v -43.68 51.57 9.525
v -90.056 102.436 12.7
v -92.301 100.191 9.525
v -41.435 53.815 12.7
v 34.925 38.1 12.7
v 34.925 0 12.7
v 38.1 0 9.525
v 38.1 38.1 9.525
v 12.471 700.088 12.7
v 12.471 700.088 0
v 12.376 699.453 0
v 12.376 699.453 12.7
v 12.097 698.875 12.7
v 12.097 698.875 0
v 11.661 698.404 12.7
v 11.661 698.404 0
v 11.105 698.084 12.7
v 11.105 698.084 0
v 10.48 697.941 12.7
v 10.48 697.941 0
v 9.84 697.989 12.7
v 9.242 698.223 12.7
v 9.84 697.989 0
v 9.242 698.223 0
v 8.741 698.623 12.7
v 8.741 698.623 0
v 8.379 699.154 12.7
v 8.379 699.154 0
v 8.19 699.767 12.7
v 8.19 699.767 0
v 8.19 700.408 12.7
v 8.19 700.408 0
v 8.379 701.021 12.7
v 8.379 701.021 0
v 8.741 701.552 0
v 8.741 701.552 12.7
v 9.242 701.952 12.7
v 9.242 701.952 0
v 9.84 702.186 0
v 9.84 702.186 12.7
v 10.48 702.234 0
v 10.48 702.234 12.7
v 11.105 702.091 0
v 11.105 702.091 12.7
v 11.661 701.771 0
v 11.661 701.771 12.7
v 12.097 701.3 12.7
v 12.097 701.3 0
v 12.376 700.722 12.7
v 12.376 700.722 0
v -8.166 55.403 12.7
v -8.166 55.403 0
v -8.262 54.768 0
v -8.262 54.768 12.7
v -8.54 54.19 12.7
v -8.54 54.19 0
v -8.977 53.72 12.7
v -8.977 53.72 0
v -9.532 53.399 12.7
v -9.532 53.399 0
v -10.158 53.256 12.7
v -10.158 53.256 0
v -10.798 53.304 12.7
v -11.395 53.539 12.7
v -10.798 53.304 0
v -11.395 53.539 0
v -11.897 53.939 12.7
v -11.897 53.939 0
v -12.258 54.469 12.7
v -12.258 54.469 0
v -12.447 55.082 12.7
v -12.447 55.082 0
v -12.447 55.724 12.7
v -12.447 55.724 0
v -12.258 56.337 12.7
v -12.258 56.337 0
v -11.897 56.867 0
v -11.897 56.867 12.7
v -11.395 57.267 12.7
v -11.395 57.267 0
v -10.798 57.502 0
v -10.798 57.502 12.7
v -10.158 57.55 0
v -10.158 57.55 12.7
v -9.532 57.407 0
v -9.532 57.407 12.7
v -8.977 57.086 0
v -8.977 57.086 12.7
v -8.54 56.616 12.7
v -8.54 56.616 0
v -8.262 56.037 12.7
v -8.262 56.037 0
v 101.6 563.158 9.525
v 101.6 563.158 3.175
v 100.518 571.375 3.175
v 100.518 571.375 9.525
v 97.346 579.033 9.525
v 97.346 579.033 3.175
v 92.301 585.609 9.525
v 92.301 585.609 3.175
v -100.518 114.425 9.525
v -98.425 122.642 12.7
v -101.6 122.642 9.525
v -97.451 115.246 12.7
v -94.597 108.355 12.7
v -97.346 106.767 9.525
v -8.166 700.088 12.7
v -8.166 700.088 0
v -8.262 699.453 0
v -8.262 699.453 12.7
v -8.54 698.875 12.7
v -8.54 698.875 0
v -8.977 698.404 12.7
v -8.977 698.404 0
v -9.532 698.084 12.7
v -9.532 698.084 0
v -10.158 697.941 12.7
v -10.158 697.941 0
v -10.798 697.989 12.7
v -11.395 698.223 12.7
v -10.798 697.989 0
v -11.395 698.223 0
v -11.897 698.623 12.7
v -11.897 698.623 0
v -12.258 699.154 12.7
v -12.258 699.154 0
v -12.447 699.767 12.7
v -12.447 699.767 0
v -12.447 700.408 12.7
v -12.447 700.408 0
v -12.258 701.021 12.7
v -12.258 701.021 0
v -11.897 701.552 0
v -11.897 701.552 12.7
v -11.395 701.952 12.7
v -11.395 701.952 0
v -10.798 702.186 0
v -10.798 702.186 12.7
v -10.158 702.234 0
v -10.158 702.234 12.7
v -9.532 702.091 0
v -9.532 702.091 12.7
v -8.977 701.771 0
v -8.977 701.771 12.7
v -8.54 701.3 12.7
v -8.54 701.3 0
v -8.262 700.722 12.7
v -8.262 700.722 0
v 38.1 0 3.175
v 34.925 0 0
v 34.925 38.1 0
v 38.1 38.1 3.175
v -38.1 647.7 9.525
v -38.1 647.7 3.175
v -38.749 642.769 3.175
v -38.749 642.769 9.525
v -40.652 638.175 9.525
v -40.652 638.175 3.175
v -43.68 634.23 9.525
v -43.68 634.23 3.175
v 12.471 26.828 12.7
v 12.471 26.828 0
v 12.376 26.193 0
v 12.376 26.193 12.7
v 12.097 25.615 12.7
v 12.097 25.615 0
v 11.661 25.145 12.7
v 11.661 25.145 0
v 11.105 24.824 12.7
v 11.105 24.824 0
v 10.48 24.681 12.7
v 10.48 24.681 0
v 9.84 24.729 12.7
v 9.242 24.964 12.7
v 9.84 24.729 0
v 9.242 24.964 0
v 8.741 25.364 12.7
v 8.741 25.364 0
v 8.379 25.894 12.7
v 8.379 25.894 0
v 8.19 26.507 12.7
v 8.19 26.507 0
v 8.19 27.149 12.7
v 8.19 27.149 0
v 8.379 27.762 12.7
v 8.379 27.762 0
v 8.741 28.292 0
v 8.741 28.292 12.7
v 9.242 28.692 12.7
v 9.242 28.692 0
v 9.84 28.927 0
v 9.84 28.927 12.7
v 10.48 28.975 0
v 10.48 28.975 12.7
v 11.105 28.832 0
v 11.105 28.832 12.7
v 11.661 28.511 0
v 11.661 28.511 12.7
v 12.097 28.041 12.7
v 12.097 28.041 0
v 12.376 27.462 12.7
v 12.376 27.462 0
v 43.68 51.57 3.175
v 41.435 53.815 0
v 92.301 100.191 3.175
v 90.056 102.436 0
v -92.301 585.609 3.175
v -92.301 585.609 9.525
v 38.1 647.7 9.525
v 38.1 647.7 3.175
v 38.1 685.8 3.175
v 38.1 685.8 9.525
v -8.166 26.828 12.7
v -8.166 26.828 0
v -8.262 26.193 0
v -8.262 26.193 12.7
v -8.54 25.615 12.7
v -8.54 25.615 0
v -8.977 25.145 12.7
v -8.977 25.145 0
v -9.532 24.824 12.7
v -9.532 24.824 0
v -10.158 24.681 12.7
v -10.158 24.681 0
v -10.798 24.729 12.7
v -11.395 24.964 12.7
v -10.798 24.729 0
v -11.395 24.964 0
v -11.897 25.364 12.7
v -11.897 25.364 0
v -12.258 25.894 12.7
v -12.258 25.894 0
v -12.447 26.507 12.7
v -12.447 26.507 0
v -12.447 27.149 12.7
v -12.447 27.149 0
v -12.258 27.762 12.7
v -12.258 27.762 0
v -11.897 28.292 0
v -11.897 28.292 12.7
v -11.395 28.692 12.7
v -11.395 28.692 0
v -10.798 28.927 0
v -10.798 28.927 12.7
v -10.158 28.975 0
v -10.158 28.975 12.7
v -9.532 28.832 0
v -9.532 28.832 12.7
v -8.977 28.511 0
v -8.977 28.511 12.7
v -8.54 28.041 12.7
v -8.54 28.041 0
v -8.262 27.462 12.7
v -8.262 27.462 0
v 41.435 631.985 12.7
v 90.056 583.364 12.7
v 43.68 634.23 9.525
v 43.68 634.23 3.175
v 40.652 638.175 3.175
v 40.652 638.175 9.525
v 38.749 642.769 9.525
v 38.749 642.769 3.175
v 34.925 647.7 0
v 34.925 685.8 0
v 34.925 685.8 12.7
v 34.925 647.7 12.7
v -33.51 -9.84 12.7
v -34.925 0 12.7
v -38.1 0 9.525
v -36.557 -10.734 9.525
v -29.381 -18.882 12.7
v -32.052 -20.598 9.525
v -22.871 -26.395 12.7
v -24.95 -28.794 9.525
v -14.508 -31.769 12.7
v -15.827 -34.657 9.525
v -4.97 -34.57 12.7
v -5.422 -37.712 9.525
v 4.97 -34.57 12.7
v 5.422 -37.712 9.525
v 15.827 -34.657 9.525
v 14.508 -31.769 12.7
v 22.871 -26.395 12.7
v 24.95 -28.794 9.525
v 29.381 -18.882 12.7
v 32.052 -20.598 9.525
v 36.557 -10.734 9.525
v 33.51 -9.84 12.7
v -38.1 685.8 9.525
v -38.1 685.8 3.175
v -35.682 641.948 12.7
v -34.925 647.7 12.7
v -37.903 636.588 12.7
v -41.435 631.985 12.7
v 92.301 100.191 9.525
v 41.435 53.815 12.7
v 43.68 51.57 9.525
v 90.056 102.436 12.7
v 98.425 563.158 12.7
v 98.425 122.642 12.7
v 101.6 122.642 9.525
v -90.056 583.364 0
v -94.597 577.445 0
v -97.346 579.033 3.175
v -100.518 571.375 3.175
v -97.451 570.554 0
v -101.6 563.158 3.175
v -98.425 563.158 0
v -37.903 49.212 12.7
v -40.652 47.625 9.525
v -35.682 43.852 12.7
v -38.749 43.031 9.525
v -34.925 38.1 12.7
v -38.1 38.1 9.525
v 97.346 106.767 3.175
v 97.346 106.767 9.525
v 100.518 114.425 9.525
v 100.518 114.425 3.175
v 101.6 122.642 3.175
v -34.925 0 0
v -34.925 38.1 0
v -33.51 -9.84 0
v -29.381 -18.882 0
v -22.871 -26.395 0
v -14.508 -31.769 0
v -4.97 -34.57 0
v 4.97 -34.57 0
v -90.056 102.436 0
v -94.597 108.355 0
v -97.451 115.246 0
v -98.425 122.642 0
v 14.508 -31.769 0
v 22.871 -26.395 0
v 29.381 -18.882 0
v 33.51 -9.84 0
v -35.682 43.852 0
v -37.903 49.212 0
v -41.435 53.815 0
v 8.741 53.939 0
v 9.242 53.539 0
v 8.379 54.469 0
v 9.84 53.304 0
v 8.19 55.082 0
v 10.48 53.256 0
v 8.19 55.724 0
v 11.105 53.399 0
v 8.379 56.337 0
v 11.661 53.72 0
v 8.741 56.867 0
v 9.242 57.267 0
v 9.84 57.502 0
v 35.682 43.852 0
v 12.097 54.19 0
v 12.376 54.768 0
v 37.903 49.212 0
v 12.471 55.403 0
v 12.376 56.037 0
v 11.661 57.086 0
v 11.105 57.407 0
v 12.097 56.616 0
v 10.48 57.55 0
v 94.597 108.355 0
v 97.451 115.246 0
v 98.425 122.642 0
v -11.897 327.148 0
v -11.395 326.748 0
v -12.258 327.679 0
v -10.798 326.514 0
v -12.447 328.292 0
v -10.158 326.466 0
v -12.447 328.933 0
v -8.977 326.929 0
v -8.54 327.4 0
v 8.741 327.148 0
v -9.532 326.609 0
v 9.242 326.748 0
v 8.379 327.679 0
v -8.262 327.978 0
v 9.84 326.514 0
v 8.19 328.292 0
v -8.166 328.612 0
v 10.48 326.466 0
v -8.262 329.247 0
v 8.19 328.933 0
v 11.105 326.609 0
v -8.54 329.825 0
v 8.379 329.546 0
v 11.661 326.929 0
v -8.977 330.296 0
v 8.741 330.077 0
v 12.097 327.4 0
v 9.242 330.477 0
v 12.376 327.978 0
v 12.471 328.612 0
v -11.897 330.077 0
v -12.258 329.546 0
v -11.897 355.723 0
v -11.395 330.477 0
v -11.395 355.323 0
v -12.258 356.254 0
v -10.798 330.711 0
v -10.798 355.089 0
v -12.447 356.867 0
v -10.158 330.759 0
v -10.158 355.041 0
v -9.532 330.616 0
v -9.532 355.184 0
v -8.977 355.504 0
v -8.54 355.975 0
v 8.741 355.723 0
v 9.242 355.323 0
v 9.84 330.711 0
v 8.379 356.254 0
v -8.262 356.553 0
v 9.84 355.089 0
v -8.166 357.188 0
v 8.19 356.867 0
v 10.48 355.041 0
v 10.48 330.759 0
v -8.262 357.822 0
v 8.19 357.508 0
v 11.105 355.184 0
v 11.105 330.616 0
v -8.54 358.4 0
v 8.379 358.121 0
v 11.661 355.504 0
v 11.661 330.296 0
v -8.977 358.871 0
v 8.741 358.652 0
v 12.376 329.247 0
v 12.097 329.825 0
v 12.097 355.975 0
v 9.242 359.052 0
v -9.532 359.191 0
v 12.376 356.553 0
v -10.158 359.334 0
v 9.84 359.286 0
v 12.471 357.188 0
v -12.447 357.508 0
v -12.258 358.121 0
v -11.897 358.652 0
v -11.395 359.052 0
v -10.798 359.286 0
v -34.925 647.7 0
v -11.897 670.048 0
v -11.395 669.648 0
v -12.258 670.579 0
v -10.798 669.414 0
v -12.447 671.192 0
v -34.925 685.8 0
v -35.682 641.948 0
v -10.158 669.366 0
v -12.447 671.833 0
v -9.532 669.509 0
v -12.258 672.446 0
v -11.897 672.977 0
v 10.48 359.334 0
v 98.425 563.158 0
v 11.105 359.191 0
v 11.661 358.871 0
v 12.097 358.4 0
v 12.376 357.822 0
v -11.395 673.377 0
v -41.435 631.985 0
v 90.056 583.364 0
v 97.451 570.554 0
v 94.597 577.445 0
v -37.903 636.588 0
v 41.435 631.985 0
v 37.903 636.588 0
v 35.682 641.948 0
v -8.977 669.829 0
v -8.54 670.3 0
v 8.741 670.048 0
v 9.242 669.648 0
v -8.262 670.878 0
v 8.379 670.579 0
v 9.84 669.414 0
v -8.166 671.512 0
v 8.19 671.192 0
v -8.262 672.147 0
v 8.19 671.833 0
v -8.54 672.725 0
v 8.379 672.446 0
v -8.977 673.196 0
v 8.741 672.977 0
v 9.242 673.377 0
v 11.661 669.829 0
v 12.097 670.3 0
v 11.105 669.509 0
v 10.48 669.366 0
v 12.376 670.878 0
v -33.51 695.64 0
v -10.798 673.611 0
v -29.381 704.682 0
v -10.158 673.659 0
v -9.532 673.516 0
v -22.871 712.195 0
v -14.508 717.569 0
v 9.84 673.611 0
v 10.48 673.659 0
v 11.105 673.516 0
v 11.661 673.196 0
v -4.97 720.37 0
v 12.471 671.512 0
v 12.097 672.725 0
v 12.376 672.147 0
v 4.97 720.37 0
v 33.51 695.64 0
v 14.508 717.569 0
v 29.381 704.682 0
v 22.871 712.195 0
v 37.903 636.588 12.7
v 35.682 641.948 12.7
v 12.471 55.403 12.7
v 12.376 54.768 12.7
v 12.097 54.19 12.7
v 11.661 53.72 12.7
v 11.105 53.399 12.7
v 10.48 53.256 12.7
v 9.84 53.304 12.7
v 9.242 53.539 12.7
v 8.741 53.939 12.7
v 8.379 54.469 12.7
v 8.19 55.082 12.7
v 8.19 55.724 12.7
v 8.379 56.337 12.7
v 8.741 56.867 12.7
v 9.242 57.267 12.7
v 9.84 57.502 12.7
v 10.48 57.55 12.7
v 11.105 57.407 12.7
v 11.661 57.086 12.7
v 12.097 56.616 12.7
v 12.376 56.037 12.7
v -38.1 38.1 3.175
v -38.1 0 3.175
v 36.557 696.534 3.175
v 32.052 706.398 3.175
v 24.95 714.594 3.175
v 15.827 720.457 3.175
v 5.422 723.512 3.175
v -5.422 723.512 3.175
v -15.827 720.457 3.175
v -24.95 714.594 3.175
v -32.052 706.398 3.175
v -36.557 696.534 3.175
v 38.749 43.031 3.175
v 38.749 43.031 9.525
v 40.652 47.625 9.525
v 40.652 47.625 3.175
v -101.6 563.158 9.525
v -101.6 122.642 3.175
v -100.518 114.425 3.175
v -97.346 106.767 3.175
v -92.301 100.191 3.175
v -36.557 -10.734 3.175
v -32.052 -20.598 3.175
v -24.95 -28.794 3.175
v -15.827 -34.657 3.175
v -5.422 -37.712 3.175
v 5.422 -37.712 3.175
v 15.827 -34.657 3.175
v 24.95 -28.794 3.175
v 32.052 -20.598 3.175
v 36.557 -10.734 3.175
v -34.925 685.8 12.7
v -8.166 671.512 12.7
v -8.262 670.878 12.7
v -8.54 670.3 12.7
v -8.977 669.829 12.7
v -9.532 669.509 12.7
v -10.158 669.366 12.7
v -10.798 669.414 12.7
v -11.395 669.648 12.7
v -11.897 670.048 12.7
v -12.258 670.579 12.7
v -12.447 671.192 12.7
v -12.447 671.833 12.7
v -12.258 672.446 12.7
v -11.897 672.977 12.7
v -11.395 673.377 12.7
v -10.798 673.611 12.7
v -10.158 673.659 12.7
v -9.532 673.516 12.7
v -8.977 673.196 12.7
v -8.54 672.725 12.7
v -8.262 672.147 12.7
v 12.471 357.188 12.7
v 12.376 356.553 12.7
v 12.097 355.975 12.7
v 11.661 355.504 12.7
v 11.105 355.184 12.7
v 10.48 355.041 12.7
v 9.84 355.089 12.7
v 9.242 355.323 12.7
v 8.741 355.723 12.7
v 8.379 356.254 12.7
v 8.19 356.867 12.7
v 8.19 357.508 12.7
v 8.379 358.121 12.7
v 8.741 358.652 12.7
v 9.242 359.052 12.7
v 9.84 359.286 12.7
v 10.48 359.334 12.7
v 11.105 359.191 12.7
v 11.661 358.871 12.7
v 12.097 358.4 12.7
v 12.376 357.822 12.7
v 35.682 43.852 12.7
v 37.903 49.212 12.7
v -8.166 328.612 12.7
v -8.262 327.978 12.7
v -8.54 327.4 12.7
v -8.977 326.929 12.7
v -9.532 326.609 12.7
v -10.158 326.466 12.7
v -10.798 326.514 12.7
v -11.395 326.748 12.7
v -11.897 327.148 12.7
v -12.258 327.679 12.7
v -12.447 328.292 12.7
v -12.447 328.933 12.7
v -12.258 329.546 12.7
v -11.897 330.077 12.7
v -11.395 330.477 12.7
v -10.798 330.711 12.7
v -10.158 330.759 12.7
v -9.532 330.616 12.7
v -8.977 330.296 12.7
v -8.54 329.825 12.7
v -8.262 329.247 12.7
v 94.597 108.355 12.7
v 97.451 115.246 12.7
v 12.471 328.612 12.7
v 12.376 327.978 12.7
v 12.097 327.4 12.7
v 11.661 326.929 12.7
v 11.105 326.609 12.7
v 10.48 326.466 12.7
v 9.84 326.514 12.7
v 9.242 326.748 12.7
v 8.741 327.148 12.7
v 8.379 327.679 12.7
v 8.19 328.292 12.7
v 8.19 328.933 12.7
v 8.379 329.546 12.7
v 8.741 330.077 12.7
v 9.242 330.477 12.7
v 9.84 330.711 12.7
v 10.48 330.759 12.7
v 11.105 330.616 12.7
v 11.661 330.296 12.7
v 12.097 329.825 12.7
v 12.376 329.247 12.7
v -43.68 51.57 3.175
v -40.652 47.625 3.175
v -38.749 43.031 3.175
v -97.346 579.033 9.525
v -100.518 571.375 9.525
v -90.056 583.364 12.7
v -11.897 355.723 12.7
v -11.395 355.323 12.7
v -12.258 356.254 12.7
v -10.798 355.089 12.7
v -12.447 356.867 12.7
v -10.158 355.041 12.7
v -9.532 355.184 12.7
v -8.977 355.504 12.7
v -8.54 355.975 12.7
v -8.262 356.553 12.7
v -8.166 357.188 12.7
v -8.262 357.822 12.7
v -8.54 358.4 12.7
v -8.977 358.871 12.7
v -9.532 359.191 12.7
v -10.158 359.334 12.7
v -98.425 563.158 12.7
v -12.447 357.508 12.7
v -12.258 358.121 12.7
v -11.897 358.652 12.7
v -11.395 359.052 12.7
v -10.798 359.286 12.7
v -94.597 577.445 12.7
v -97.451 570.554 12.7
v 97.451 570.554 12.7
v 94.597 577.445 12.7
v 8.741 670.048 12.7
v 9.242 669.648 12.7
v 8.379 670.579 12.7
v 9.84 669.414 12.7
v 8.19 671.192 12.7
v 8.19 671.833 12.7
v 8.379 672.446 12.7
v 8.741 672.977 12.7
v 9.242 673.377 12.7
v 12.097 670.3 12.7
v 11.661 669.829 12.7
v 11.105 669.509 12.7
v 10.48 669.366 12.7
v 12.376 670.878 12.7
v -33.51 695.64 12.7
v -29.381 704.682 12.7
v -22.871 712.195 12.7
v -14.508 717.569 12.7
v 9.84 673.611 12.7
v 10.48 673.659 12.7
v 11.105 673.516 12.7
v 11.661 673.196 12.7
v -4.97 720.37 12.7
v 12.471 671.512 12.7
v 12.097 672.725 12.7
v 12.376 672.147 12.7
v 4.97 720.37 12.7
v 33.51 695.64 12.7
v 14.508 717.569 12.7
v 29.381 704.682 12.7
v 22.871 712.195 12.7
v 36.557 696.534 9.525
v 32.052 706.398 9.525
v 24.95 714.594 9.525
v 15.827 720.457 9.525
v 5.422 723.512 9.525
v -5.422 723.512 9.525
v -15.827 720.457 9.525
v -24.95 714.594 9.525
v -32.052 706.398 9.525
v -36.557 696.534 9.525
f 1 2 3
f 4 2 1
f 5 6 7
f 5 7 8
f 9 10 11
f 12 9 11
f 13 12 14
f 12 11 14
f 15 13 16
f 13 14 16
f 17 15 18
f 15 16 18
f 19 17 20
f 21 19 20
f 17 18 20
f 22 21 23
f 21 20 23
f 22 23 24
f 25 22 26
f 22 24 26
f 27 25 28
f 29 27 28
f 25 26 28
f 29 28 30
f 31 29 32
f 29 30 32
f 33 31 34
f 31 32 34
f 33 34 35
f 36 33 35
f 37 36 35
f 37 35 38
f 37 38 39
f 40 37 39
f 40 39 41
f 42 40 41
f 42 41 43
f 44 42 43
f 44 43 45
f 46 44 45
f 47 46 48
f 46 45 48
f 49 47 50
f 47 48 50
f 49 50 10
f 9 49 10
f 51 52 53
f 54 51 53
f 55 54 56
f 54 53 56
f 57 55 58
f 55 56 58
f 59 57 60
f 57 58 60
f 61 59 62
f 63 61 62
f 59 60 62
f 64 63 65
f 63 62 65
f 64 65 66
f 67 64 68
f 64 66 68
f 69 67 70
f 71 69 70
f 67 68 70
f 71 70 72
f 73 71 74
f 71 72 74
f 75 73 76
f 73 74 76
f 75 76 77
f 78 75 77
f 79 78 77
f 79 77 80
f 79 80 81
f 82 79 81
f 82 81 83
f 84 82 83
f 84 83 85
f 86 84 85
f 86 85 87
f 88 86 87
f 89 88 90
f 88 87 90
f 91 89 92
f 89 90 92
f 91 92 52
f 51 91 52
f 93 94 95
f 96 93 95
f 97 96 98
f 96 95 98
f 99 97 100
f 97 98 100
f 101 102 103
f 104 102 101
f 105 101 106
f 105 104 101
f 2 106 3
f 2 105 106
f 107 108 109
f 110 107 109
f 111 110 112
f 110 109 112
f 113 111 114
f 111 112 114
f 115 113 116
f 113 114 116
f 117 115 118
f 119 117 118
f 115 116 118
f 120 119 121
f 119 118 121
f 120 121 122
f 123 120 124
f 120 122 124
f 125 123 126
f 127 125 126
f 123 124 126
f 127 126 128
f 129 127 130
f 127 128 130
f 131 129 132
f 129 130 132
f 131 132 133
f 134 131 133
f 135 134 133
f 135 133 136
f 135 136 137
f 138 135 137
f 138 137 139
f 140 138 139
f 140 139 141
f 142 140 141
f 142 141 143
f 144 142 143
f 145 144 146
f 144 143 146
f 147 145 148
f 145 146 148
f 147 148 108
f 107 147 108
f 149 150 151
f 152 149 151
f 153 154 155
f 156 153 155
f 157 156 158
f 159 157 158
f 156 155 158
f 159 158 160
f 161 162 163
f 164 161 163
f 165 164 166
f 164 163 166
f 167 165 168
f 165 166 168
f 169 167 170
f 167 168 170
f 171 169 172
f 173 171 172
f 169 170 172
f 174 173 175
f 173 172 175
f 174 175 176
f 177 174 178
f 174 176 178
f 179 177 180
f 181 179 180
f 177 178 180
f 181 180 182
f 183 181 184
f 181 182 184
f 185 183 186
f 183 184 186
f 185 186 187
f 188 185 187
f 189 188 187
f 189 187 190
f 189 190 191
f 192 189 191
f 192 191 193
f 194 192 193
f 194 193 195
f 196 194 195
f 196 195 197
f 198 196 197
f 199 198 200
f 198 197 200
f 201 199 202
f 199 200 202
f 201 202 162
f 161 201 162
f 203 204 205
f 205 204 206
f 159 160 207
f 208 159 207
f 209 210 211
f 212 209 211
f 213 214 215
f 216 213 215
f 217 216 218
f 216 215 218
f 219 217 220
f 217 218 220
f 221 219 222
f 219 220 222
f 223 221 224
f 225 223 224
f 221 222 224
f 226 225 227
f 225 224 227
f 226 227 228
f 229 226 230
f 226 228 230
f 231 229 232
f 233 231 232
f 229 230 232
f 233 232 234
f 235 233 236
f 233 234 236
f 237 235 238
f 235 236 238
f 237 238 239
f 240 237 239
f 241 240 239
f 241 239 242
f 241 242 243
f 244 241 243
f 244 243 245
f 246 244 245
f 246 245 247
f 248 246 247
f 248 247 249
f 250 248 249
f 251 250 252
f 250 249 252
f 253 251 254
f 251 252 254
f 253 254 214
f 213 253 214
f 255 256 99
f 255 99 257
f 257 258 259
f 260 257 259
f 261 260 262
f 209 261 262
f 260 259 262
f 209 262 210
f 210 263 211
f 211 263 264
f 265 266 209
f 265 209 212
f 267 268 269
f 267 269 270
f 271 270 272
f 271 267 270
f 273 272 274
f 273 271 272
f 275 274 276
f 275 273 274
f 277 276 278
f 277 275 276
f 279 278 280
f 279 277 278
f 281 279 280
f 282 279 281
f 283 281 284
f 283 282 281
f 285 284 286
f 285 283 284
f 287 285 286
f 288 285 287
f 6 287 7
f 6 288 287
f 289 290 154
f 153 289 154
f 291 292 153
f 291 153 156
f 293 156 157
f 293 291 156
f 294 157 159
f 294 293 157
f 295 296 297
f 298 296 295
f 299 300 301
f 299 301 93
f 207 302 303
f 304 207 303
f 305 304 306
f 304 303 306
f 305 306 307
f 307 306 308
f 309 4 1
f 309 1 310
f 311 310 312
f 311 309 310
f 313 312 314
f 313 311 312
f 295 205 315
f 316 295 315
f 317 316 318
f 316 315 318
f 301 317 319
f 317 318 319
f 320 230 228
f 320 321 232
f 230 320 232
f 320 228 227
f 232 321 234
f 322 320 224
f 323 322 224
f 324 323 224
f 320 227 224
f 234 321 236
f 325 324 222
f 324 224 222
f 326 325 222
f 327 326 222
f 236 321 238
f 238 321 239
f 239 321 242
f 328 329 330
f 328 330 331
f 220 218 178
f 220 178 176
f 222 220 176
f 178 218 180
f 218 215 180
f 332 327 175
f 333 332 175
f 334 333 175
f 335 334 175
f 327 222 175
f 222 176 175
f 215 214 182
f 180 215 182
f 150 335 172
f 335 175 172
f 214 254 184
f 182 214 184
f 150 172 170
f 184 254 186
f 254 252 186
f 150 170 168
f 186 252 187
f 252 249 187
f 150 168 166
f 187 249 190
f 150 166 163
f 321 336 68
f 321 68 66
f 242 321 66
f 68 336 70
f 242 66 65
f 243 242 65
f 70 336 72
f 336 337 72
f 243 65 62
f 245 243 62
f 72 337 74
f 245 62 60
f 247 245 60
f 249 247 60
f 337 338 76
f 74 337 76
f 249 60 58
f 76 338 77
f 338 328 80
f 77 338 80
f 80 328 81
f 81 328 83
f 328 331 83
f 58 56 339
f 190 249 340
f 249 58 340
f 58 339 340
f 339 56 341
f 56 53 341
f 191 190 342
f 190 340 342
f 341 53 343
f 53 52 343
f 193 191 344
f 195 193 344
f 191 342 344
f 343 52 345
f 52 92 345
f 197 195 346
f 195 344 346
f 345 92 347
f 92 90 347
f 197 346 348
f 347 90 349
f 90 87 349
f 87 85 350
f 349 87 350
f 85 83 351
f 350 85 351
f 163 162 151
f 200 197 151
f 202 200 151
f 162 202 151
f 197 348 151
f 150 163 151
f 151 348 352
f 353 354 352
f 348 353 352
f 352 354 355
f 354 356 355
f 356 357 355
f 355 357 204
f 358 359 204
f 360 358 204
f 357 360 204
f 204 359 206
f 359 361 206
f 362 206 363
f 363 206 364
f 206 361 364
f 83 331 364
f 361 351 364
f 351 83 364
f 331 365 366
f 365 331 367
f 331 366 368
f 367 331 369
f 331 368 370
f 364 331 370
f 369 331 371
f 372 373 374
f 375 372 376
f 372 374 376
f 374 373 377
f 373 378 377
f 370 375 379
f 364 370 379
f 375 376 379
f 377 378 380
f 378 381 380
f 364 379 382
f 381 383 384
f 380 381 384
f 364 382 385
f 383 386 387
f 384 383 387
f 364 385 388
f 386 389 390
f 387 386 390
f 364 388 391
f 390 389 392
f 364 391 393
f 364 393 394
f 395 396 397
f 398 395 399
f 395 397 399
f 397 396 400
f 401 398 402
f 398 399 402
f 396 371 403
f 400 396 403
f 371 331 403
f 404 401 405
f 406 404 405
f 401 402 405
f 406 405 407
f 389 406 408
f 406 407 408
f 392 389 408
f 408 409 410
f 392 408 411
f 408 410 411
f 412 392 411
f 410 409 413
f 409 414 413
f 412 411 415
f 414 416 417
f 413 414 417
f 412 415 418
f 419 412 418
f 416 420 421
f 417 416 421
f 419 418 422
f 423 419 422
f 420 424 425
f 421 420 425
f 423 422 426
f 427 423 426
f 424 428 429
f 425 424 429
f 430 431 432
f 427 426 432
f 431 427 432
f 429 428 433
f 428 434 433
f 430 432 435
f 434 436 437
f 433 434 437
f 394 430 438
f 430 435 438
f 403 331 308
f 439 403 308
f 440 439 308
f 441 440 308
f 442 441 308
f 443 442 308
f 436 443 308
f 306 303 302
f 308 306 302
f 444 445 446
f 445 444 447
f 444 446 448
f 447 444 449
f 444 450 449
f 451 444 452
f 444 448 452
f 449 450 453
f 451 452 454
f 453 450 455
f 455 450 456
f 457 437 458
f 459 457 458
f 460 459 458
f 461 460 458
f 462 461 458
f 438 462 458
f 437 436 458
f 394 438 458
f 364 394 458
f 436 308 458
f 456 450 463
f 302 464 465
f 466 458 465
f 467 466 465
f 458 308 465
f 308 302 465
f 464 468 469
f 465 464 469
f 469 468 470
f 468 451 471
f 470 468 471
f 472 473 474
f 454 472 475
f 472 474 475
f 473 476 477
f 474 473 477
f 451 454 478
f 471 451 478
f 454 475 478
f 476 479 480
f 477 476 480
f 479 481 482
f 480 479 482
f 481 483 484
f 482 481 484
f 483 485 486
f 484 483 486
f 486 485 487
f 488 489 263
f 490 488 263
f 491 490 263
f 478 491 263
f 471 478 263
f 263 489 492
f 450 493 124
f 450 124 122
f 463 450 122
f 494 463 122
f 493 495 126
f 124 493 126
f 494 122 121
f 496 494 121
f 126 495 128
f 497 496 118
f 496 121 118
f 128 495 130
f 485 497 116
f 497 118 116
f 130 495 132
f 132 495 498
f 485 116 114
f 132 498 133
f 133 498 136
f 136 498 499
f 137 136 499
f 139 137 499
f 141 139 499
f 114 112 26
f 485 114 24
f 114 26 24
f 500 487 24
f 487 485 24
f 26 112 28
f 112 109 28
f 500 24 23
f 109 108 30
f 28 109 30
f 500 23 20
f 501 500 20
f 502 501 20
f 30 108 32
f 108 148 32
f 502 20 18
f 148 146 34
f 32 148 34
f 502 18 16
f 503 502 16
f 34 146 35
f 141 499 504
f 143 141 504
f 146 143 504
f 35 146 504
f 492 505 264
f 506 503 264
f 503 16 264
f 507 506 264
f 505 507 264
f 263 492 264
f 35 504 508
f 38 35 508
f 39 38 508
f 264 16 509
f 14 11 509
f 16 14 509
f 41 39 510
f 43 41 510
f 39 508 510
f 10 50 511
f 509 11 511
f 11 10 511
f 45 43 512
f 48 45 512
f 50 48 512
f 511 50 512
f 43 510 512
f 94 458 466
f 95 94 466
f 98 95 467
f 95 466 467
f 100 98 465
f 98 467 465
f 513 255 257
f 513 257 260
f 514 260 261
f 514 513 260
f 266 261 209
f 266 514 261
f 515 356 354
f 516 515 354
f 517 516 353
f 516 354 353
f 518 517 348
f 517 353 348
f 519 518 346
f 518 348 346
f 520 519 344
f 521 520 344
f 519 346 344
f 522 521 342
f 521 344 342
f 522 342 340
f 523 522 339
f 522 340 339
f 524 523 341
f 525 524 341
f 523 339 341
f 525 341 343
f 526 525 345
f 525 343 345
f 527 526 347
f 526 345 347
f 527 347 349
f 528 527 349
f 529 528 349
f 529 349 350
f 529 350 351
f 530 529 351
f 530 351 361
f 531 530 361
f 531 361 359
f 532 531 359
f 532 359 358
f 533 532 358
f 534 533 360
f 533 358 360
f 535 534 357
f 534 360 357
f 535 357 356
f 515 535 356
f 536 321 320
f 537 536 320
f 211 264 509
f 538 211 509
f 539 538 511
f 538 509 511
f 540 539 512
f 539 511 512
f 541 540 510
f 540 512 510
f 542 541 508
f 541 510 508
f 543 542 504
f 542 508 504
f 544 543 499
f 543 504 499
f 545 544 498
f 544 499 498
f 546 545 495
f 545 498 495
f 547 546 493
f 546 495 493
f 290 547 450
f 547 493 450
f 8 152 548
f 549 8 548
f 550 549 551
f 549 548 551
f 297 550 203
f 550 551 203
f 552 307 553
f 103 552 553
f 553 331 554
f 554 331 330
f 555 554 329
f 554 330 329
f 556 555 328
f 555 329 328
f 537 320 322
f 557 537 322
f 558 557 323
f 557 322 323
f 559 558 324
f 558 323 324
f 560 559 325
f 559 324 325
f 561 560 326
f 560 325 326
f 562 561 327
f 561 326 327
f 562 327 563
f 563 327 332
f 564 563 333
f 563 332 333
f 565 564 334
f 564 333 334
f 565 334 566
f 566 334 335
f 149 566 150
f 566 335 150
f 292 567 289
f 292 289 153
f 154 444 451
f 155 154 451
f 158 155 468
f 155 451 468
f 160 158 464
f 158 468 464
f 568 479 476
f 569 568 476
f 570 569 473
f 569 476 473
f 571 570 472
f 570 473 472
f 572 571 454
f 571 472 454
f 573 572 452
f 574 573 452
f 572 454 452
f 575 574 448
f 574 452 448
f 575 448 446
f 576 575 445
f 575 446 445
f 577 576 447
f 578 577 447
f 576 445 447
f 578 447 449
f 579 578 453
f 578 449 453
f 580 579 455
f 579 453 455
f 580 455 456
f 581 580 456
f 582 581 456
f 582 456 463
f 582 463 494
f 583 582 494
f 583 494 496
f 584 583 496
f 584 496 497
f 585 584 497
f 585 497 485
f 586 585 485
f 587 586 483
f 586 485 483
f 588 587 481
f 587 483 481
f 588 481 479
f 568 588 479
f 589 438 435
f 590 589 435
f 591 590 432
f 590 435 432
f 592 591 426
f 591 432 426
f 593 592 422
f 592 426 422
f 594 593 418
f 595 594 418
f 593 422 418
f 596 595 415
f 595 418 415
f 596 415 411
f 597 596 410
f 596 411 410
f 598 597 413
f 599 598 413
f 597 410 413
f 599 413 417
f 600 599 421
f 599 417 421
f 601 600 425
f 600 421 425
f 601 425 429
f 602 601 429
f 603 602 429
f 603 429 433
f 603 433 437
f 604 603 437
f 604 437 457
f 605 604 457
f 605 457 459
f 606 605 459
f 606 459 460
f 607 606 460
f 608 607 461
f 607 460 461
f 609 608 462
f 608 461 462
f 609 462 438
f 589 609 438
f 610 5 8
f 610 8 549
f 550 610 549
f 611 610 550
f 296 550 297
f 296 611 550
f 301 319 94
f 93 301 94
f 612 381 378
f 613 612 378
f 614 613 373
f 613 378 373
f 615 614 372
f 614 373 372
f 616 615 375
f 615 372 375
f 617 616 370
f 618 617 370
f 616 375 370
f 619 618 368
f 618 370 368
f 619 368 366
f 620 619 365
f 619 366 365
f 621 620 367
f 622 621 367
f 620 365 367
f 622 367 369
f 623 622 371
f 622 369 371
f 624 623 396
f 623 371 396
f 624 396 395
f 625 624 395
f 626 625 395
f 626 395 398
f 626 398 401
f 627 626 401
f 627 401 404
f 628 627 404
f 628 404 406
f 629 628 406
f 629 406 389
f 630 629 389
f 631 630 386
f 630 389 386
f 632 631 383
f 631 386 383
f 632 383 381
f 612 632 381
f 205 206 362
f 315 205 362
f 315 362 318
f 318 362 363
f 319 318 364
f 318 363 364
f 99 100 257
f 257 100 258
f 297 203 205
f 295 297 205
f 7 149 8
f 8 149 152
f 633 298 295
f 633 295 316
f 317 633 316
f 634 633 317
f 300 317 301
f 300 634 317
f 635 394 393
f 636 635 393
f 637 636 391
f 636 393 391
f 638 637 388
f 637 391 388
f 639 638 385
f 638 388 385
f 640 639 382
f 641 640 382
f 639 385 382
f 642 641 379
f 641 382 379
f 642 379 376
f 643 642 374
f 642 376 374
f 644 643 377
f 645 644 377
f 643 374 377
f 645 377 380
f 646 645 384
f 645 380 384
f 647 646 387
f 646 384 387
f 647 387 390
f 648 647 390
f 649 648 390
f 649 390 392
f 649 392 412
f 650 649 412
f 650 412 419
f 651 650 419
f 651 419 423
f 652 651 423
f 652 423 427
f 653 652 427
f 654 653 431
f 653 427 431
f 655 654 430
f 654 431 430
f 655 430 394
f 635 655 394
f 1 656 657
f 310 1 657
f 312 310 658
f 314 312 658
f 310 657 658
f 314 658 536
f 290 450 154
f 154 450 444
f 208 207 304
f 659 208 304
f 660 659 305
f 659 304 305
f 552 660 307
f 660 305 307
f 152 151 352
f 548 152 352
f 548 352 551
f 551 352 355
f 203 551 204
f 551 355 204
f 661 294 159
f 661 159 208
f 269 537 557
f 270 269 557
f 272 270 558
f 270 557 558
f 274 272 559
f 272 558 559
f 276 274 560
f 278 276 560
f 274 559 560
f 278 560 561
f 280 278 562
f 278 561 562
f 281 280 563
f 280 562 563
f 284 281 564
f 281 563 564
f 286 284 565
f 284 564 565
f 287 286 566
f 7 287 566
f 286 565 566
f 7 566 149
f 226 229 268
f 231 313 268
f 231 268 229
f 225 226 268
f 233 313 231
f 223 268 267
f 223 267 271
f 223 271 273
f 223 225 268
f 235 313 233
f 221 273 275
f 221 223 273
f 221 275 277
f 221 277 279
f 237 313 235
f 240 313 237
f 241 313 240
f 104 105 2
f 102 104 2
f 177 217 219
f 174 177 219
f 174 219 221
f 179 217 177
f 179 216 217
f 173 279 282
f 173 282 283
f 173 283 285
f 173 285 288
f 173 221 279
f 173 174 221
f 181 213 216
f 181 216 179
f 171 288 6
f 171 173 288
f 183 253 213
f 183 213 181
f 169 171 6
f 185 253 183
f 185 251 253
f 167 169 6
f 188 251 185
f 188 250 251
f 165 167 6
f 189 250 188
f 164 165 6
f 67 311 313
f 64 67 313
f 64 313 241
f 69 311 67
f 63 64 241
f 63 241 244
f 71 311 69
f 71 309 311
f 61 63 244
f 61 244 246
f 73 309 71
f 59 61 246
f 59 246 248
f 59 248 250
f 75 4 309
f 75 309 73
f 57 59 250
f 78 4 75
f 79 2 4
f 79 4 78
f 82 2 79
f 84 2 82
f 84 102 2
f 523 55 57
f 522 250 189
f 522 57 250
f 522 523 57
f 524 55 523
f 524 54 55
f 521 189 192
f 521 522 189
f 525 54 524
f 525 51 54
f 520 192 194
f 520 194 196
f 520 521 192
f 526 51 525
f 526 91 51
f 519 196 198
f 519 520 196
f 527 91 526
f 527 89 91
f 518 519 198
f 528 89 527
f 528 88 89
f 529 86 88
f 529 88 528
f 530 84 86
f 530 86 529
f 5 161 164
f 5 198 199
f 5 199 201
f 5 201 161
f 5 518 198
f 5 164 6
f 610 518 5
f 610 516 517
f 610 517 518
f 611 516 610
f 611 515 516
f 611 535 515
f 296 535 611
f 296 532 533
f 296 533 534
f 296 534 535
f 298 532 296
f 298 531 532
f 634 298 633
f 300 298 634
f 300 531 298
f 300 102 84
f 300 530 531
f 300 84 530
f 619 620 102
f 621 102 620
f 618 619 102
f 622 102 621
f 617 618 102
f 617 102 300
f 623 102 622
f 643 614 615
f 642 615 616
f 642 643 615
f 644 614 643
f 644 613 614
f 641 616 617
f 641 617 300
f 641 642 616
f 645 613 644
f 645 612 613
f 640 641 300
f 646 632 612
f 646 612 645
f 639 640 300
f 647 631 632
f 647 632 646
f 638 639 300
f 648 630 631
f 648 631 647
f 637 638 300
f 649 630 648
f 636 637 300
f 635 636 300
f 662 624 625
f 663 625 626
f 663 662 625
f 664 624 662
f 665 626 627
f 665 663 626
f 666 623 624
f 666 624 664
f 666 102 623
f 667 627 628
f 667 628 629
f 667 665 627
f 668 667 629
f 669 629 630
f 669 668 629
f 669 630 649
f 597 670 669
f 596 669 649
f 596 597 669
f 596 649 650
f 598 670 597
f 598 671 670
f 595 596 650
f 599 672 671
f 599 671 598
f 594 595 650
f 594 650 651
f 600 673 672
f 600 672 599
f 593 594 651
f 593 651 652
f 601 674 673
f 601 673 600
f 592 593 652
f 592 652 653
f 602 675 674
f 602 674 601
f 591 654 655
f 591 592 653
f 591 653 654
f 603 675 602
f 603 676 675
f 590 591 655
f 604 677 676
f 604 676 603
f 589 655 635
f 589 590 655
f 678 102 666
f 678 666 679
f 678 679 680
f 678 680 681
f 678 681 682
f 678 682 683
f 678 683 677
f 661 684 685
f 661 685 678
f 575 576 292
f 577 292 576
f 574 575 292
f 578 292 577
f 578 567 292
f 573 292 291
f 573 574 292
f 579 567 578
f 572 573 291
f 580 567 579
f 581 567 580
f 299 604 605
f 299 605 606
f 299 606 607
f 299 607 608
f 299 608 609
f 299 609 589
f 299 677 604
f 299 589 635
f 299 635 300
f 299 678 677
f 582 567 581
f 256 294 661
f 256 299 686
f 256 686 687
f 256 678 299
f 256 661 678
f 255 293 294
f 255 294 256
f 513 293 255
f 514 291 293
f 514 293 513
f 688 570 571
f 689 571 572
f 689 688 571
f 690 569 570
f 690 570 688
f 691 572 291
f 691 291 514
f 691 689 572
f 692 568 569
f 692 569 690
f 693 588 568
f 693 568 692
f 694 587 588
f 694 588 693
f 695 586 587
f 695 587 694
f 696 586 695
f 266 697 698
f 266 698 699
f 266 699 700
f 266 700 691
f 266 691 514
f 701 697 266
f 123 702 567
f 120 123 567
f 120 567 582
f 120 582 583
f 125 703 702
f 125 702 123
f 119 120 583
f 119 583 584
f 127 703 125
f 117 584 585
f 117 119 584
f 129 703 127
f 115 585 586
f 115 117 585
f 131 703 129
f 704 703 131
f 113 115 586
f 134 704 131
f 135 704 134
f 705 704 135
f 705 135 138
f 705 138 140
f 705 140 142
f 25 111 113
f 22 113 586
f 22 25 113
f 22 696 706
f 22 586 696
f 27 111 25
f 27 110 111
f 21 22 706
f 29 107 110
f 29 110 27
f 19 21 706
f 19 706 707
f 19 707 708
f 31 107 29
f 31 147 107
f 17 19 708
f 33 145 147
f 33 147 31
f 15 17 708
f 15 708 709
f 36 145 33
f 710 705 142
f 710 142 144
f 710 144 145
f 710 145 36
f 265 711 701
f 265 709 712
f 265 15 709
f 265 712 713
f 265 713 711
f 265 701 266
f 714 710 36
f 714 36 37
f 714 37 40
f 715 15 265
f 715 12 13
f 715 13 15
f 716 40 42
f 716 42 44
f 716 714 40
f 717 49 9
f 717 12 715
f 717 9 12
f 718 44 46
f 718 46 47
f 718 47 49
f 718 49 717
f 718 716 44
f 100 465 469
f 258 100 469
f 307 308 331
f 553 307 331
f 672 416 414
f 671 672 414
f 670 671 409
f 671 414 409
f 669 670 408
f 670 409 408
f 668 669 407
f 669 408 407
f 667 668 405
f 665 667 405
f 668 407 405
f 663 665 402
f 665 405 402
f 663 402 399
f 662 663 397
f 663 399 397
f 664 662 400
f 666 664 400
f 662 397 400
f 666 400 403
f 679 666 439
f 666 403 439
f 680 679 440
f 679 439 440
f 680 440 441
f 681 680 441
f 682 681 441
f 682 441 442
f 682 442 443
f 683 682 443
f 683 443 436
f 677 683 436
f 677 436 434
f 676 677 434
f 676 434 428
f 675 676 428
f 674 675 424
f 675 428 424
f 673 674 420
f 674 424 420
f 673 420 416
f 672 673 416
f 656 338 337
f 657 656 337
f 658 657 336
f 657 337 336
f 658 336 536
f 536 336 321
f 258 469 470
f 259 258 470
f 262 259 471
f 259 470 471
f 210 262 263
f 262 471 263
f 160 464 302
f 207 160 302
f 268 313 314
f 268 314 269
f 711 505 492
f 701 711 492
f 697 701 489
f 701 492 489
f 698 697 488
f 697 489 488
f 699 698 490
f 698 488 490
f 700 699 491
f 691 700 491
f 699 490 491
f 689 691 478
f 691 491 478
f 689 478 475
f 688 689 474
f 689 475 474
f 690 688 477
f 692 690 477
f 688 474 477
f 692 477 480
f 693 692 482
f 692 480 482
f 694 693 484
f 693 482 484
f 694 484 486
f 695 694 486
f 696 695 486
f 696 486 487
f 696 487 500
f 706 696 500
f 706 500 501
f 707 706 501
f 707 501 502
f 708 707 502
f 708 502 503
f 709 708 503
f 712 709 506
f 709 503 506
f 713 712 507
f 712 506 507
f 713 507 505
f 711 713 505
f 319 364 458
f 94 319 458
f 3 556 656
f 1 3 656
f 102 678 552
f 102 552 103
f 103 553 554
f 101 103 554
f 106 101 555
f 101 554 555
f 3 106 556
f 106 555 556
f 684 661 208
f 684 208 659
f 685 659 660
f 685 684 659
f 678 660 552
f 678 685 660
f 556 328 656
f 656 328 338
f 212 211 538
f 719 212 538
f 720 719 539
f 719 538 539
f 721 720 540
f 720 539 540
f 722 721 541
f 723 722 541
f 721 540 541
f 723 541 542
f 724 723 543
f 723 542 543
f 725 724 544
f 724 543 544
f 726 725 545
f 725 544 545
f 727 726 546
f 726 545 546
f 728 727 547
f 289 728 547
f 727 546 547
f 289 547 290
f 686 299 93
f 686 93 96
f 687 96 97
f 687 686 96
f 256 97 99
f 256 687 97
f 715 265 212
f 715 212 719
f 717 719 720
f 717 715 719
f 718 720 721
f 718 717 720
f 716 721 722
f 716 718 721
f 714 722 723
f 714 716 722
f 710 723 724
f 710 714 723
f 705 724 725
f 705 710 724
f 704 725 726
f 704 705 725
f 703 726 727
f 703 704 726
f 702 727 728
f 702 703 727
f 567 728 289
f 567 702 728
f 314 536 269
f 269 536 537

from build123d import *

# Parameters (mm, degrees)
F1_DEPTH = 12.7
F2_SIZE  = 3.175
F3_R     = 2.15265
F4_DEPTH = 12.7


with BuildPart() as f1:
    # F0 (on Top) → F1 (new body)
    with BuildSketch(Plane.XY):
        with BuildLine():
            Line((-38.1, 38.1), (-38.1, 0))
            ThreePointArc((-38.1, 0), (0, -38.1), (38.1, 0))
            Line((38.1, 0), (38.1, 38.1))
            ThreePointArc((38.1, 38.1), (39.550095, 45.390119), (43.679616, 51.570384))
            Line((43.679616, 51.570384), (92.30064, 100.191409))
            ThreePointArc((92.30064, 100.191409), (99.183175, 110.49185), (101.6, 122.642049))
            Line((101.6, 122.642049), (101.6, 563.157951))
            ThreePointArc((101.6, 563.157951), (99.183175, 575.30815), (92.30064, 585.608591))
            Line((92.30064, 585.608591), (43.679616, 634.229616))
            ThreePointArc((43.679616, 634.229616), (39.550095, 640.409881), (38.1, 647.7))
            Line((38.1, 647.7), (38.1, 685.8))
            ThreePointArc((38.1, 685.8), (0, 723.9), (-38.1, 685.8))
            Line((-38.1, 685.8), (-38.1, 647.7))
            ThreePointArc((-38.1, 647.7), (-39.550095, 640.409881), (-43.679616, 634.229616))
            Line((-43.679616, 634.229616), (-92.30064, 585.608591))
            ThreePointArc((-92.30064, 585.608591), (-99.183175, 575.30815), (-101.6, 563.157951))
            Line((-101.6, 563.157951), (-101.6, 122.642049))
            ThreePointArc((-101.6, 122.642049), (-99.183175, 110.49185), (-92.30064, 100.191409))
            Line((-92.30064, 100.191409), (-43.679616, 51.570384))
            ThreePointArc((-43.679616, 51.570384), (-39.550095, 45.390119), (-38.1, 38.1))
        make_face()
    extrude(amount=F1_DEPTH)

    # F2
    f2_edges = [f1.edges().sort_by_distance(p)[0] for p in [
        (-39.550095, 45.390119, 0),
        (-38.1, 19.05, 0),
        (0, -38.1, 0),
        (38.1, 19.05, 0),
        (39.550095, 45.390119, 0),
        (67.990128, 75.880896, 0),
        (99.183175, 110.49185, 0),
        (101.6, 342.9, 0),
        (99.183175, 575.30815, 0),
        (67.990128, 609.919104, 0),
        (39.550095, 640.409881, 0),
        (38.1, 666.75, 0),
        (0, 723.9, 0),
        (-38.1, 666.75, 0),
        (-39.550095, 640.409881, 0),
        (-67.990128, 609.919104, 0),
        (-99.183175, 575.30815, 0),
        (-101.6, 342.9, 0),
        (-99.183175, 110.49185, 0),
        (-67.990128, 75.880896, 0),
        (-39.550095, 45.390119, 12.7),
        (-38.1, 19.05, 12.7),
        (0, -38.1, 12.7),
        (38.1, 19.05, 12.7),
        (39.550095, 45.390119, 12.7),
        (67.990128, 75.880896, 12.7),
        (99.183175, 110.49185, 12.7),
        (101.6, 342.9, 12.7),
        (99.183175, 575.30815, 12.7),
        (67.990128, 609.919104, 12.7),
        (39.550095, 640.409881, 12.7),
        (38.1, 666.75, 12.7),
        (0, 723.9, 12.7),
        (-38.1, 666.75, 12.7),
        (-39.550095, 640.409881, 12.7),
        (-67.990128, 609.919104, 12.7),
        (-99.183175, 575.30815, 12.7),
        (-101.6, 342.9, 12.7),
        (-99.183175, 110.49185, 12.7),
        (-67.990128, 75.880896, 12.7),
    ]]
    chamfer(f2_edges, length=F2_SIZE)

    # F3 (on face) → F4 (cut, through all)
    with BuildSketch(Plane(origin=(0, 0, 0), x_dir=(1, 0, 0), z_dir=(0, 0, -1))):
        with Locations((10.31875, -700.0875)):
            Circle(F3_R)
        with Locations((10.31875, -671.5125)):
            Circle(F3_R)
        with Locations((-10.31875, -671.5125)):
            Circle(F3_R)
        with Locations((-10.31875, -700.0875)):
            Circle(F3_R)
        with Locations((10.31875, -55.402948)):
            Circle(F3_R)
        with Locations((10.31875, -26.827948)):
            Circle(F3_R)
        with Locations((-10.31875, -55.402948)):
            Circle(F3_R)
        with Locations((-10.31875, -26.827948)):
            Circle(F3_R)
        with Locations((10.31875, -357.1875)):
            Circle(F3_R)
        with Locations((10.31875, -328.6125)):
            Circle(F3_R)
        with Locations((-10.31875, -328.6125)):
            Circle(F3_R)
        with Locations((-10.31875, -357.1875)):
            Circle(F3_R)
    extrude(amount=-F4_DEPTH, mode=Mode.SUBTRACT)


solid = f1.part
